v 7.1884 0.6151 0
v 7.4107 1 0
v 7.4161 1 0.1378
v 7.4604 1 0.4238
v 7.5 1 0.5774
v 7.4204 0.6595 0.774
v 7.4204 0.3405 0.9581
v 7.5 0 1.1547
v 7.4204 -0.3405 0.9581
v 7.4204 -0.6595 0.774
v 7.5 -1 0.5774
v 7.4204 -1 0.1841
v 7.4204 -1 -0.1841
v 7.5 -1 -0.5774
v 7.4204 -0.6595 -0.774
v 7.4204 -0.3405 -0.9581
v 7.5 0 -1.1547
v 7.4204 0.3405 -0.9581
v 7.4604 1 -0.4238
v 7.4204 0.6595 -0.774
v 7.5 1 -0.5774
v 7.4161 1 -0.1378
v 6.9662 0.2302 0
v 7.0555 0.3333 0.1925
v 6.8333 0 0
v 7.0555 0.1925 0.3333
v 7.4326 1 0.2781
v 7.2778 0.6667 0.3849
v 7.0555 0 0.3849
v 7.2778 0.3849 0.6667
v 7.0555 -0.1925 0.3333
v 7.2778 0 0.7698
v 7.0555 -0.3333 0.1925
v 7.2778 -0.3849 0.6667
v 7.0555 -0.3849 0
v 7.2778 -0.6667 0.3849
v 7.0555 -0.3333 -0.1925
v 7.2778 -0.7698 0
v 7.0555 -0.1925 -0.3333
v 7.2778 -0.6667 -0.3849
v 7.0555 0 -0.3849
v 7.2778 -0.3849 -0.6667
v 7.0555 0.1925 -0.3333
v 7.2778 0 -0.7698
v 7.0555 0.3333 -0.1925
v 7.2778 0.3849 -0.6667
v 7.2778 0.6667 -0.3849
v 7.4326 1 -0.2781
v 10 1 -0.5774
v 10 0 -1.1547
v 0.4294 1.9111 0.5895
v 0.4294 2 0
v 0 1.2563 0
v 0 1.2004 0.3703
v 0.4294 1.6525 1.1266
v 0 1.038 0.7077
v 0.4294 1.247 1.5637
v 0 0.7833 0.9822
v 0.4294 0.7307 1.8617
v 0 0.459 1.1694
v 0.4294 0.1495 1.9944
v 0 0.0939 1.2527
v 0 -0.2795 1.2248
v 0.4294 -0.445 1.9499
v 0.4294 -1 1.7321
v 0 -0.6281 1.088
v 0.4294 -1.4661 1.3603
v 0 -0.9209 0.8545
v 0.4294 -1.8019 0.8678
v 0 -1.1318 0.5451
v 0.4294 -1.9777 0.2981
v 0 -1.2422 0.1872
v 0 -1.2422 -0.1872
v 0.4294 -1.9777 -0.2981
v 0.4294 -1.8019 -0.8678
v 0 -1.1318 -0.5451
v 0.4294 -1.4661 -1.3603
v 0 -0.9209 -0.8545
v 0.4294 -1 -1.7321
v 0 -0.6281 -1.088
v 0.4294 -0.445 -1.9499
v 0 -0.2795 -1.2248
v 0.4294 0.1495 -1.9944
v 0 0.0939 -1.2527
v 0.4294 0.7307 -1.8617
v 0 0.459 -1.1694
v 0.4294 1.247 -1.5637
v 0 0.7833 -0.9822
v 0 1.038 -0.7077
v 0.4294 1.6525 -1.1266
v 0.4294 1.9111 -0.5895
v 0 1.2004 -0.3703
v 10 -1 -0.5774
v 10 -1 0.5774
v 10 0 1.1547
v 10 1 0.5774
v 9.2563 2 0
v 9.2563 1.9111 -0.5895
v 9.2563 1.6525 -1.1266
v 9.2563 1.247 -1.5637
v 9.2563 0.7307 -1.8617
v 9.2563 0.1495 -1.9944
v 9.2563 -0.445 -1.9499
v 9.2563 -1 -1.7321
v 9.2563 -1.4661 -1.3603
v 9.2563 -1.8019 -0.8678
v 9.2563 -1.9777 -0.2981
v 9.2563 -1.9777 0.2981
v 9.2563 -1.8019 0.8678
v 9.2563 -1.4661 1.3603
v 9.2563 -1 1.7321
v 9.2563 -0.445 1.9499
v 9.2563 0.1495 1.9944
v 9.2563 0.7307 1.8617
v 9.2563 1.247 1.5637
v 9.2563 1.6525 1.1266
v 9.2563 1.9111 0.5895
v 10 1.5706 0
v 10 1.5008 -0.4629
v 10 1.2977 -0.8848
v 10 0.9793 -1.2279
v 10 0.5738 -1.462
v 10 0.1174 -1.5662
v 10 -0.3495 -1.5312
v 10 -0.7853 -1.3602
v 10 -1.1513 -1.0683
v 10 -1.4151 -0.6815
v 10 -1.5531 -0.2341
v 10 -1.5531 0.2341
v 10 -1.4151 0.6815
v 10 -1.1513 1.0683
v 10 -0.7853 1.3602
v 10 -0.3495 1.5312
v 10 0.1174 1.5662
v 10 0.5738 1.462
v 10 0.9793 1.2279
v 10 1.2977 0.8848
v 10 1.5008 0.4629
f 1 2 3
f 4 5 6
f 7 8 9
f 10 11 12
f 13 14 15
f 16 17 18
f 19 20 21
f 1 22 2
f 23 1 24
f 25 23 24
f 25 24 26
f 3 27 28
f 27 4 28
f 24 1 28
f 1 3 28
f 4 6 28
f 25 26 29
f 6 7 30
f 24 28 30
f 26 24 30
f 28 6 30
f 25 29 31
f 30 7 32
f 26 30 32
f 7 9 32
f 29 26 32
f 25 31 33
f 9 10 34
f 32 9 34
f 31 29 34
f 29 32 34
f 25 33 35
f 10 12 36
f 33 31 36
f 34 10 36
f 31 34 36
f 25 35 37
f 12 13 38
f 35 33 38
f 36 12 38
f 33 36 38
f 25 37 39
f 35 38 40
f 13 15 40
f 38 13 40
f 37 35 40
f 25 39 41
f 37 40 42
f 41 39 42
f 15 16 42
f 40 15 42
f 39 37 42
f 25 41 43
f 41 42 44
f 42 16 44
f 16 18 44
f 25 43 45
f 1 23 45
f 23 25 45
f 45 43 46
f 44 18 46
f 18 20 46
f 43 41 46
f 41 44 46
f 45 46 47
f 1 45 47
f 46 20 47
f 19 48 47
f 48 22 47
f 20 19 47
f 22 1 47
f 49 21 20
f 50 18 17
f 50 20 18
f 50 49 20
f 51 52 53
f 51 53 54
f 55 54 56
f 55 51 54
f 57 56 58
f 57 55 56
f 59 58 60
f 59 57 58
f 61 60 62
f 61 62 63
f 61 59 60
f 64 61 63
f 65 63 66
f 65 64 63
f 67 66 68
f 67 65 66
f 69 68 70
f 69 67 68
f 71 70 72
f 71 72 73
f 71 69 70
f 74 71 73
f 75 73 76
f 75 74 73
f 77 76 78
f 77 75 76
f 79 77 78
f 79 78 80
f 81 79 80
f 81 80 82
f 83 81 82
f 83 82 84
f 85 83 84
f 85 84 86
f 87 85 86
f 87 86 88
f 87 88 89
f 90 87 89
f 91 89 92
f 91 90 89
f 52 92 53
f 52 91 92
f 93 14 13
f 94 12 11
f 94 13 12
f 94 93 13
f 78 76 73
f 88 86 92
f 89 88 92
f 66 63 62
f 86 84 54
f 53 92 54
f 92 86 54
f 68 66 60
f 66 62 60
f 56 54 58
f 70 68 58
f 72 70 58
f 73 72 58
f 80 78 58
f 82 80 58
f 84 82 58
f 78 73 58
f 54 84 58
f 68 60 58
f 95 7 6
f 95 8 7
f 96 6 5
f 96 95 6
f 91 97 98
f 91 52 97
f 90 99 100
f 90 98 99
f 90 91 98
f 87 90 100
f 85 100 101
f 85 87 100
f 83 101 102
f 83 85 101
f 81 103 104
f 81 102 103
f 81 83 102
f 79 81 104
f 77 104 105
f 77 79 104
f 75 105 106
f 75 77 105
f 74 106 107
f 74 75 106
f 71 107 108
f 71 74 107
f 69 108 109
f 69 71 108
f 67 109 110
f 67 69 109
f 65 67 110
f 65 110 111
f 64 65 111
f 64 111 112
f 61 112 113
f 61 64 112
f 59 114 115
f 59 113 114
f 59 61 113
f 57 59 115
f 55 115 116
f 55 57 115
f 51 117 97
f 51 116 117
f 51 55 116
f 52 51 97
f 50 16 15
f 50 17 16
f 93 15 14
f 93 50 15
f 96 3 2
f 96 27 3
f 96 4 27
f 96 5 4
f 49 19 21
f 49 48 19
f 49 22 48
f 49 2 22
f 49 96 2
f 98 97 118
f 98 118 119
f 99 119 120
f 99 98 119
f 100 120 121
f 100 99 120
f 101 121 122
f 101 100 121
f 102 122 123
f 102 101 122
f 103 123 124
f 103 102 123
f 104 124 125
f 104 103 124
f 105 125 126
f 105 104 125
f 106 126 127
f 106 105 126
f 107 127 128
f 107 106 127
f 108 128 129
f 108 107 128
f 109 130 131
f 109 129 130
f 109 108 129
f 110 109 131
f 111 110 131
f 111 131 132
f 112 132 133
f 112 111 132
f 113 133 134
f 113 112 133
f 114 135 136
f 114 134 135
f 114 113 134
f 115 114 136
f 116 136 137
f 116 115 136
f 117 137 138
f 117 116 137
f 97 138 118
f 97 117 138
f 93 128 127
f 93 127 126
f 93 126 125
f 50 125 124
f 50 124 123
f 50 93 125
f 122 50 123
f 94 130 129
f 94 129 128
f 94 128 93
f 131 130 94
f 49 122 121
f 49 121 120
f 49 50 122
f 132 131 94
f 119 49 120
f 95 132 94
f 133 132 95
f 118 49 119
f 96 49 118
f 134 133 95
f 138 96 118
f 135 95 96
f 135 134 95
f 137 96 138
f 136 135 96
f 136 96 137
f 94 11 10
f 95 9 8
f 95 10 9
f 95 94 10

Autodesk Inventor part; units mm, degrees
ref_plane "YZ Plane" through (0, 0, 0) normal (1, 0, 0) x (0, 1, 0)
ref_plane "XZ Plane" through (0, 0, 0) normal (0, 1, 0) x (-1, 0, 0)
sketch "Sketch1" plane through (0, 0, 0) normal (0, 0, 1) x (1, 0, 0)
  line L0 (0, 0) -> (6.8333, 0)
  line L1 (10, 1.1547) -> (10, 2)
  line L2 (10, 2) -> (0, 2)
  line L3 (10, 1.1547) -> (7.5, 1.1547)
  line L4 (7.5, 1.1547) -> (6.8333, 0)
  line L5 (0, -0.4) -> (0, 2.4) projected
  line L6 (0, 2) -> (0, 0)
  dimension "d0" = 2.5
  dimension "d1" = 60
  dimension "d2" = 4
  dimension "d3" = 2.3094
  dimension "d5" = 10
revolve "Body" add sketch "Sketch1" angle 360 about axis through (0, 0, 0) along (1, 0, 0)
chamfer "Chamfer1" distance 0.4294 angle 60 1 edges at (10, -2, 0) measured on face at (10, 1.6877, -0.2517)
sketch "Sketch2" plane through (10, 0, 0) normal (1, 0, 0) x (0, 0, -1)
  circle A0 centre (0, 0) radius 1.1547 projected
  line L0 (-0.5774, 1) -> (0.5774, 1)
  line L1 (0.5774, 1) -> (1.1547, 0)
  line L2 (1.1547, 0) -> (0.5774, -1)
  line L3 (0.5774, -1) -> (-0.5774, -1)
  line L4 (-0.5774, -1) -> (-1.1547, 0)
  line L5 (-1.1547, 0) -> (-0.5774, 1)
  point P0 (0, 0)
  point P1 (0, 0)
extrude "Slot" add sketch "Sketch2" against normal up to next contours L1 A0 | A0 L2 | L0 A0 | A0 L3 | L5 A0 | A0 L4
thread "Thread" size "M4x0.7" class "6g" standard "ISO Metric profile" length 10
chamfer "Chamfer2" distance 0.4294 angle 60 1 edges at (0, -2, 0) measured on face at (3.0854, 1.9741, -0.3208)
ref_plane "Work Plane1" through (5, 0, 0) normal (0, 0.5, 0.866) x (1, 0, 0)
equation "\"d0\" = INTI"
equation "\"d2\" = NND"
equation "\"d3\" = 1.1547 * SW"
equation "\"d5\" = NLG"
equation "\"d7\" = -0.5 * GD1 + 0.5 * NND"
equation "\"d8\" = FAWI"
equation "\"d29\" = -0.5 * GD1 + 0.5 * NND"
equation "\"d11\" = NLG"
equation "\"d13\" = -0.5 * GD1 + 0.5 * NND"
equation "\"d14\" = FAWI"
equation "\"d30\" = -0.5 * GD1 + 0.5 * NND"
equation "\"NND\" = 4"
equation "\"NLG\" = 10"
equation "\"INTI\" = 2.5"
equation "\"FAWI\" = 60deg"
equation "\"SW\" = 2"
equation "\"GD1\" = THREADDIA - 1.2269 * PTC"
equation "\"FAWI1\" = 45deg"
equation "\"GUL\" = 0.61345 * PTC"
equation "\"SPD\" = 2"
equation "\"TOA\" = 30deg"
equation "\"THREADDIA\" = 4"
equation "\"PTC\" = 0.7"
equation "\"GAL\" = 0.61345 * PTC"
equation "\"E0\" = 1.155 * SW"
properties part number "AS 1421 - M4 x 10 Flat Point" material "Steel, Mild"
